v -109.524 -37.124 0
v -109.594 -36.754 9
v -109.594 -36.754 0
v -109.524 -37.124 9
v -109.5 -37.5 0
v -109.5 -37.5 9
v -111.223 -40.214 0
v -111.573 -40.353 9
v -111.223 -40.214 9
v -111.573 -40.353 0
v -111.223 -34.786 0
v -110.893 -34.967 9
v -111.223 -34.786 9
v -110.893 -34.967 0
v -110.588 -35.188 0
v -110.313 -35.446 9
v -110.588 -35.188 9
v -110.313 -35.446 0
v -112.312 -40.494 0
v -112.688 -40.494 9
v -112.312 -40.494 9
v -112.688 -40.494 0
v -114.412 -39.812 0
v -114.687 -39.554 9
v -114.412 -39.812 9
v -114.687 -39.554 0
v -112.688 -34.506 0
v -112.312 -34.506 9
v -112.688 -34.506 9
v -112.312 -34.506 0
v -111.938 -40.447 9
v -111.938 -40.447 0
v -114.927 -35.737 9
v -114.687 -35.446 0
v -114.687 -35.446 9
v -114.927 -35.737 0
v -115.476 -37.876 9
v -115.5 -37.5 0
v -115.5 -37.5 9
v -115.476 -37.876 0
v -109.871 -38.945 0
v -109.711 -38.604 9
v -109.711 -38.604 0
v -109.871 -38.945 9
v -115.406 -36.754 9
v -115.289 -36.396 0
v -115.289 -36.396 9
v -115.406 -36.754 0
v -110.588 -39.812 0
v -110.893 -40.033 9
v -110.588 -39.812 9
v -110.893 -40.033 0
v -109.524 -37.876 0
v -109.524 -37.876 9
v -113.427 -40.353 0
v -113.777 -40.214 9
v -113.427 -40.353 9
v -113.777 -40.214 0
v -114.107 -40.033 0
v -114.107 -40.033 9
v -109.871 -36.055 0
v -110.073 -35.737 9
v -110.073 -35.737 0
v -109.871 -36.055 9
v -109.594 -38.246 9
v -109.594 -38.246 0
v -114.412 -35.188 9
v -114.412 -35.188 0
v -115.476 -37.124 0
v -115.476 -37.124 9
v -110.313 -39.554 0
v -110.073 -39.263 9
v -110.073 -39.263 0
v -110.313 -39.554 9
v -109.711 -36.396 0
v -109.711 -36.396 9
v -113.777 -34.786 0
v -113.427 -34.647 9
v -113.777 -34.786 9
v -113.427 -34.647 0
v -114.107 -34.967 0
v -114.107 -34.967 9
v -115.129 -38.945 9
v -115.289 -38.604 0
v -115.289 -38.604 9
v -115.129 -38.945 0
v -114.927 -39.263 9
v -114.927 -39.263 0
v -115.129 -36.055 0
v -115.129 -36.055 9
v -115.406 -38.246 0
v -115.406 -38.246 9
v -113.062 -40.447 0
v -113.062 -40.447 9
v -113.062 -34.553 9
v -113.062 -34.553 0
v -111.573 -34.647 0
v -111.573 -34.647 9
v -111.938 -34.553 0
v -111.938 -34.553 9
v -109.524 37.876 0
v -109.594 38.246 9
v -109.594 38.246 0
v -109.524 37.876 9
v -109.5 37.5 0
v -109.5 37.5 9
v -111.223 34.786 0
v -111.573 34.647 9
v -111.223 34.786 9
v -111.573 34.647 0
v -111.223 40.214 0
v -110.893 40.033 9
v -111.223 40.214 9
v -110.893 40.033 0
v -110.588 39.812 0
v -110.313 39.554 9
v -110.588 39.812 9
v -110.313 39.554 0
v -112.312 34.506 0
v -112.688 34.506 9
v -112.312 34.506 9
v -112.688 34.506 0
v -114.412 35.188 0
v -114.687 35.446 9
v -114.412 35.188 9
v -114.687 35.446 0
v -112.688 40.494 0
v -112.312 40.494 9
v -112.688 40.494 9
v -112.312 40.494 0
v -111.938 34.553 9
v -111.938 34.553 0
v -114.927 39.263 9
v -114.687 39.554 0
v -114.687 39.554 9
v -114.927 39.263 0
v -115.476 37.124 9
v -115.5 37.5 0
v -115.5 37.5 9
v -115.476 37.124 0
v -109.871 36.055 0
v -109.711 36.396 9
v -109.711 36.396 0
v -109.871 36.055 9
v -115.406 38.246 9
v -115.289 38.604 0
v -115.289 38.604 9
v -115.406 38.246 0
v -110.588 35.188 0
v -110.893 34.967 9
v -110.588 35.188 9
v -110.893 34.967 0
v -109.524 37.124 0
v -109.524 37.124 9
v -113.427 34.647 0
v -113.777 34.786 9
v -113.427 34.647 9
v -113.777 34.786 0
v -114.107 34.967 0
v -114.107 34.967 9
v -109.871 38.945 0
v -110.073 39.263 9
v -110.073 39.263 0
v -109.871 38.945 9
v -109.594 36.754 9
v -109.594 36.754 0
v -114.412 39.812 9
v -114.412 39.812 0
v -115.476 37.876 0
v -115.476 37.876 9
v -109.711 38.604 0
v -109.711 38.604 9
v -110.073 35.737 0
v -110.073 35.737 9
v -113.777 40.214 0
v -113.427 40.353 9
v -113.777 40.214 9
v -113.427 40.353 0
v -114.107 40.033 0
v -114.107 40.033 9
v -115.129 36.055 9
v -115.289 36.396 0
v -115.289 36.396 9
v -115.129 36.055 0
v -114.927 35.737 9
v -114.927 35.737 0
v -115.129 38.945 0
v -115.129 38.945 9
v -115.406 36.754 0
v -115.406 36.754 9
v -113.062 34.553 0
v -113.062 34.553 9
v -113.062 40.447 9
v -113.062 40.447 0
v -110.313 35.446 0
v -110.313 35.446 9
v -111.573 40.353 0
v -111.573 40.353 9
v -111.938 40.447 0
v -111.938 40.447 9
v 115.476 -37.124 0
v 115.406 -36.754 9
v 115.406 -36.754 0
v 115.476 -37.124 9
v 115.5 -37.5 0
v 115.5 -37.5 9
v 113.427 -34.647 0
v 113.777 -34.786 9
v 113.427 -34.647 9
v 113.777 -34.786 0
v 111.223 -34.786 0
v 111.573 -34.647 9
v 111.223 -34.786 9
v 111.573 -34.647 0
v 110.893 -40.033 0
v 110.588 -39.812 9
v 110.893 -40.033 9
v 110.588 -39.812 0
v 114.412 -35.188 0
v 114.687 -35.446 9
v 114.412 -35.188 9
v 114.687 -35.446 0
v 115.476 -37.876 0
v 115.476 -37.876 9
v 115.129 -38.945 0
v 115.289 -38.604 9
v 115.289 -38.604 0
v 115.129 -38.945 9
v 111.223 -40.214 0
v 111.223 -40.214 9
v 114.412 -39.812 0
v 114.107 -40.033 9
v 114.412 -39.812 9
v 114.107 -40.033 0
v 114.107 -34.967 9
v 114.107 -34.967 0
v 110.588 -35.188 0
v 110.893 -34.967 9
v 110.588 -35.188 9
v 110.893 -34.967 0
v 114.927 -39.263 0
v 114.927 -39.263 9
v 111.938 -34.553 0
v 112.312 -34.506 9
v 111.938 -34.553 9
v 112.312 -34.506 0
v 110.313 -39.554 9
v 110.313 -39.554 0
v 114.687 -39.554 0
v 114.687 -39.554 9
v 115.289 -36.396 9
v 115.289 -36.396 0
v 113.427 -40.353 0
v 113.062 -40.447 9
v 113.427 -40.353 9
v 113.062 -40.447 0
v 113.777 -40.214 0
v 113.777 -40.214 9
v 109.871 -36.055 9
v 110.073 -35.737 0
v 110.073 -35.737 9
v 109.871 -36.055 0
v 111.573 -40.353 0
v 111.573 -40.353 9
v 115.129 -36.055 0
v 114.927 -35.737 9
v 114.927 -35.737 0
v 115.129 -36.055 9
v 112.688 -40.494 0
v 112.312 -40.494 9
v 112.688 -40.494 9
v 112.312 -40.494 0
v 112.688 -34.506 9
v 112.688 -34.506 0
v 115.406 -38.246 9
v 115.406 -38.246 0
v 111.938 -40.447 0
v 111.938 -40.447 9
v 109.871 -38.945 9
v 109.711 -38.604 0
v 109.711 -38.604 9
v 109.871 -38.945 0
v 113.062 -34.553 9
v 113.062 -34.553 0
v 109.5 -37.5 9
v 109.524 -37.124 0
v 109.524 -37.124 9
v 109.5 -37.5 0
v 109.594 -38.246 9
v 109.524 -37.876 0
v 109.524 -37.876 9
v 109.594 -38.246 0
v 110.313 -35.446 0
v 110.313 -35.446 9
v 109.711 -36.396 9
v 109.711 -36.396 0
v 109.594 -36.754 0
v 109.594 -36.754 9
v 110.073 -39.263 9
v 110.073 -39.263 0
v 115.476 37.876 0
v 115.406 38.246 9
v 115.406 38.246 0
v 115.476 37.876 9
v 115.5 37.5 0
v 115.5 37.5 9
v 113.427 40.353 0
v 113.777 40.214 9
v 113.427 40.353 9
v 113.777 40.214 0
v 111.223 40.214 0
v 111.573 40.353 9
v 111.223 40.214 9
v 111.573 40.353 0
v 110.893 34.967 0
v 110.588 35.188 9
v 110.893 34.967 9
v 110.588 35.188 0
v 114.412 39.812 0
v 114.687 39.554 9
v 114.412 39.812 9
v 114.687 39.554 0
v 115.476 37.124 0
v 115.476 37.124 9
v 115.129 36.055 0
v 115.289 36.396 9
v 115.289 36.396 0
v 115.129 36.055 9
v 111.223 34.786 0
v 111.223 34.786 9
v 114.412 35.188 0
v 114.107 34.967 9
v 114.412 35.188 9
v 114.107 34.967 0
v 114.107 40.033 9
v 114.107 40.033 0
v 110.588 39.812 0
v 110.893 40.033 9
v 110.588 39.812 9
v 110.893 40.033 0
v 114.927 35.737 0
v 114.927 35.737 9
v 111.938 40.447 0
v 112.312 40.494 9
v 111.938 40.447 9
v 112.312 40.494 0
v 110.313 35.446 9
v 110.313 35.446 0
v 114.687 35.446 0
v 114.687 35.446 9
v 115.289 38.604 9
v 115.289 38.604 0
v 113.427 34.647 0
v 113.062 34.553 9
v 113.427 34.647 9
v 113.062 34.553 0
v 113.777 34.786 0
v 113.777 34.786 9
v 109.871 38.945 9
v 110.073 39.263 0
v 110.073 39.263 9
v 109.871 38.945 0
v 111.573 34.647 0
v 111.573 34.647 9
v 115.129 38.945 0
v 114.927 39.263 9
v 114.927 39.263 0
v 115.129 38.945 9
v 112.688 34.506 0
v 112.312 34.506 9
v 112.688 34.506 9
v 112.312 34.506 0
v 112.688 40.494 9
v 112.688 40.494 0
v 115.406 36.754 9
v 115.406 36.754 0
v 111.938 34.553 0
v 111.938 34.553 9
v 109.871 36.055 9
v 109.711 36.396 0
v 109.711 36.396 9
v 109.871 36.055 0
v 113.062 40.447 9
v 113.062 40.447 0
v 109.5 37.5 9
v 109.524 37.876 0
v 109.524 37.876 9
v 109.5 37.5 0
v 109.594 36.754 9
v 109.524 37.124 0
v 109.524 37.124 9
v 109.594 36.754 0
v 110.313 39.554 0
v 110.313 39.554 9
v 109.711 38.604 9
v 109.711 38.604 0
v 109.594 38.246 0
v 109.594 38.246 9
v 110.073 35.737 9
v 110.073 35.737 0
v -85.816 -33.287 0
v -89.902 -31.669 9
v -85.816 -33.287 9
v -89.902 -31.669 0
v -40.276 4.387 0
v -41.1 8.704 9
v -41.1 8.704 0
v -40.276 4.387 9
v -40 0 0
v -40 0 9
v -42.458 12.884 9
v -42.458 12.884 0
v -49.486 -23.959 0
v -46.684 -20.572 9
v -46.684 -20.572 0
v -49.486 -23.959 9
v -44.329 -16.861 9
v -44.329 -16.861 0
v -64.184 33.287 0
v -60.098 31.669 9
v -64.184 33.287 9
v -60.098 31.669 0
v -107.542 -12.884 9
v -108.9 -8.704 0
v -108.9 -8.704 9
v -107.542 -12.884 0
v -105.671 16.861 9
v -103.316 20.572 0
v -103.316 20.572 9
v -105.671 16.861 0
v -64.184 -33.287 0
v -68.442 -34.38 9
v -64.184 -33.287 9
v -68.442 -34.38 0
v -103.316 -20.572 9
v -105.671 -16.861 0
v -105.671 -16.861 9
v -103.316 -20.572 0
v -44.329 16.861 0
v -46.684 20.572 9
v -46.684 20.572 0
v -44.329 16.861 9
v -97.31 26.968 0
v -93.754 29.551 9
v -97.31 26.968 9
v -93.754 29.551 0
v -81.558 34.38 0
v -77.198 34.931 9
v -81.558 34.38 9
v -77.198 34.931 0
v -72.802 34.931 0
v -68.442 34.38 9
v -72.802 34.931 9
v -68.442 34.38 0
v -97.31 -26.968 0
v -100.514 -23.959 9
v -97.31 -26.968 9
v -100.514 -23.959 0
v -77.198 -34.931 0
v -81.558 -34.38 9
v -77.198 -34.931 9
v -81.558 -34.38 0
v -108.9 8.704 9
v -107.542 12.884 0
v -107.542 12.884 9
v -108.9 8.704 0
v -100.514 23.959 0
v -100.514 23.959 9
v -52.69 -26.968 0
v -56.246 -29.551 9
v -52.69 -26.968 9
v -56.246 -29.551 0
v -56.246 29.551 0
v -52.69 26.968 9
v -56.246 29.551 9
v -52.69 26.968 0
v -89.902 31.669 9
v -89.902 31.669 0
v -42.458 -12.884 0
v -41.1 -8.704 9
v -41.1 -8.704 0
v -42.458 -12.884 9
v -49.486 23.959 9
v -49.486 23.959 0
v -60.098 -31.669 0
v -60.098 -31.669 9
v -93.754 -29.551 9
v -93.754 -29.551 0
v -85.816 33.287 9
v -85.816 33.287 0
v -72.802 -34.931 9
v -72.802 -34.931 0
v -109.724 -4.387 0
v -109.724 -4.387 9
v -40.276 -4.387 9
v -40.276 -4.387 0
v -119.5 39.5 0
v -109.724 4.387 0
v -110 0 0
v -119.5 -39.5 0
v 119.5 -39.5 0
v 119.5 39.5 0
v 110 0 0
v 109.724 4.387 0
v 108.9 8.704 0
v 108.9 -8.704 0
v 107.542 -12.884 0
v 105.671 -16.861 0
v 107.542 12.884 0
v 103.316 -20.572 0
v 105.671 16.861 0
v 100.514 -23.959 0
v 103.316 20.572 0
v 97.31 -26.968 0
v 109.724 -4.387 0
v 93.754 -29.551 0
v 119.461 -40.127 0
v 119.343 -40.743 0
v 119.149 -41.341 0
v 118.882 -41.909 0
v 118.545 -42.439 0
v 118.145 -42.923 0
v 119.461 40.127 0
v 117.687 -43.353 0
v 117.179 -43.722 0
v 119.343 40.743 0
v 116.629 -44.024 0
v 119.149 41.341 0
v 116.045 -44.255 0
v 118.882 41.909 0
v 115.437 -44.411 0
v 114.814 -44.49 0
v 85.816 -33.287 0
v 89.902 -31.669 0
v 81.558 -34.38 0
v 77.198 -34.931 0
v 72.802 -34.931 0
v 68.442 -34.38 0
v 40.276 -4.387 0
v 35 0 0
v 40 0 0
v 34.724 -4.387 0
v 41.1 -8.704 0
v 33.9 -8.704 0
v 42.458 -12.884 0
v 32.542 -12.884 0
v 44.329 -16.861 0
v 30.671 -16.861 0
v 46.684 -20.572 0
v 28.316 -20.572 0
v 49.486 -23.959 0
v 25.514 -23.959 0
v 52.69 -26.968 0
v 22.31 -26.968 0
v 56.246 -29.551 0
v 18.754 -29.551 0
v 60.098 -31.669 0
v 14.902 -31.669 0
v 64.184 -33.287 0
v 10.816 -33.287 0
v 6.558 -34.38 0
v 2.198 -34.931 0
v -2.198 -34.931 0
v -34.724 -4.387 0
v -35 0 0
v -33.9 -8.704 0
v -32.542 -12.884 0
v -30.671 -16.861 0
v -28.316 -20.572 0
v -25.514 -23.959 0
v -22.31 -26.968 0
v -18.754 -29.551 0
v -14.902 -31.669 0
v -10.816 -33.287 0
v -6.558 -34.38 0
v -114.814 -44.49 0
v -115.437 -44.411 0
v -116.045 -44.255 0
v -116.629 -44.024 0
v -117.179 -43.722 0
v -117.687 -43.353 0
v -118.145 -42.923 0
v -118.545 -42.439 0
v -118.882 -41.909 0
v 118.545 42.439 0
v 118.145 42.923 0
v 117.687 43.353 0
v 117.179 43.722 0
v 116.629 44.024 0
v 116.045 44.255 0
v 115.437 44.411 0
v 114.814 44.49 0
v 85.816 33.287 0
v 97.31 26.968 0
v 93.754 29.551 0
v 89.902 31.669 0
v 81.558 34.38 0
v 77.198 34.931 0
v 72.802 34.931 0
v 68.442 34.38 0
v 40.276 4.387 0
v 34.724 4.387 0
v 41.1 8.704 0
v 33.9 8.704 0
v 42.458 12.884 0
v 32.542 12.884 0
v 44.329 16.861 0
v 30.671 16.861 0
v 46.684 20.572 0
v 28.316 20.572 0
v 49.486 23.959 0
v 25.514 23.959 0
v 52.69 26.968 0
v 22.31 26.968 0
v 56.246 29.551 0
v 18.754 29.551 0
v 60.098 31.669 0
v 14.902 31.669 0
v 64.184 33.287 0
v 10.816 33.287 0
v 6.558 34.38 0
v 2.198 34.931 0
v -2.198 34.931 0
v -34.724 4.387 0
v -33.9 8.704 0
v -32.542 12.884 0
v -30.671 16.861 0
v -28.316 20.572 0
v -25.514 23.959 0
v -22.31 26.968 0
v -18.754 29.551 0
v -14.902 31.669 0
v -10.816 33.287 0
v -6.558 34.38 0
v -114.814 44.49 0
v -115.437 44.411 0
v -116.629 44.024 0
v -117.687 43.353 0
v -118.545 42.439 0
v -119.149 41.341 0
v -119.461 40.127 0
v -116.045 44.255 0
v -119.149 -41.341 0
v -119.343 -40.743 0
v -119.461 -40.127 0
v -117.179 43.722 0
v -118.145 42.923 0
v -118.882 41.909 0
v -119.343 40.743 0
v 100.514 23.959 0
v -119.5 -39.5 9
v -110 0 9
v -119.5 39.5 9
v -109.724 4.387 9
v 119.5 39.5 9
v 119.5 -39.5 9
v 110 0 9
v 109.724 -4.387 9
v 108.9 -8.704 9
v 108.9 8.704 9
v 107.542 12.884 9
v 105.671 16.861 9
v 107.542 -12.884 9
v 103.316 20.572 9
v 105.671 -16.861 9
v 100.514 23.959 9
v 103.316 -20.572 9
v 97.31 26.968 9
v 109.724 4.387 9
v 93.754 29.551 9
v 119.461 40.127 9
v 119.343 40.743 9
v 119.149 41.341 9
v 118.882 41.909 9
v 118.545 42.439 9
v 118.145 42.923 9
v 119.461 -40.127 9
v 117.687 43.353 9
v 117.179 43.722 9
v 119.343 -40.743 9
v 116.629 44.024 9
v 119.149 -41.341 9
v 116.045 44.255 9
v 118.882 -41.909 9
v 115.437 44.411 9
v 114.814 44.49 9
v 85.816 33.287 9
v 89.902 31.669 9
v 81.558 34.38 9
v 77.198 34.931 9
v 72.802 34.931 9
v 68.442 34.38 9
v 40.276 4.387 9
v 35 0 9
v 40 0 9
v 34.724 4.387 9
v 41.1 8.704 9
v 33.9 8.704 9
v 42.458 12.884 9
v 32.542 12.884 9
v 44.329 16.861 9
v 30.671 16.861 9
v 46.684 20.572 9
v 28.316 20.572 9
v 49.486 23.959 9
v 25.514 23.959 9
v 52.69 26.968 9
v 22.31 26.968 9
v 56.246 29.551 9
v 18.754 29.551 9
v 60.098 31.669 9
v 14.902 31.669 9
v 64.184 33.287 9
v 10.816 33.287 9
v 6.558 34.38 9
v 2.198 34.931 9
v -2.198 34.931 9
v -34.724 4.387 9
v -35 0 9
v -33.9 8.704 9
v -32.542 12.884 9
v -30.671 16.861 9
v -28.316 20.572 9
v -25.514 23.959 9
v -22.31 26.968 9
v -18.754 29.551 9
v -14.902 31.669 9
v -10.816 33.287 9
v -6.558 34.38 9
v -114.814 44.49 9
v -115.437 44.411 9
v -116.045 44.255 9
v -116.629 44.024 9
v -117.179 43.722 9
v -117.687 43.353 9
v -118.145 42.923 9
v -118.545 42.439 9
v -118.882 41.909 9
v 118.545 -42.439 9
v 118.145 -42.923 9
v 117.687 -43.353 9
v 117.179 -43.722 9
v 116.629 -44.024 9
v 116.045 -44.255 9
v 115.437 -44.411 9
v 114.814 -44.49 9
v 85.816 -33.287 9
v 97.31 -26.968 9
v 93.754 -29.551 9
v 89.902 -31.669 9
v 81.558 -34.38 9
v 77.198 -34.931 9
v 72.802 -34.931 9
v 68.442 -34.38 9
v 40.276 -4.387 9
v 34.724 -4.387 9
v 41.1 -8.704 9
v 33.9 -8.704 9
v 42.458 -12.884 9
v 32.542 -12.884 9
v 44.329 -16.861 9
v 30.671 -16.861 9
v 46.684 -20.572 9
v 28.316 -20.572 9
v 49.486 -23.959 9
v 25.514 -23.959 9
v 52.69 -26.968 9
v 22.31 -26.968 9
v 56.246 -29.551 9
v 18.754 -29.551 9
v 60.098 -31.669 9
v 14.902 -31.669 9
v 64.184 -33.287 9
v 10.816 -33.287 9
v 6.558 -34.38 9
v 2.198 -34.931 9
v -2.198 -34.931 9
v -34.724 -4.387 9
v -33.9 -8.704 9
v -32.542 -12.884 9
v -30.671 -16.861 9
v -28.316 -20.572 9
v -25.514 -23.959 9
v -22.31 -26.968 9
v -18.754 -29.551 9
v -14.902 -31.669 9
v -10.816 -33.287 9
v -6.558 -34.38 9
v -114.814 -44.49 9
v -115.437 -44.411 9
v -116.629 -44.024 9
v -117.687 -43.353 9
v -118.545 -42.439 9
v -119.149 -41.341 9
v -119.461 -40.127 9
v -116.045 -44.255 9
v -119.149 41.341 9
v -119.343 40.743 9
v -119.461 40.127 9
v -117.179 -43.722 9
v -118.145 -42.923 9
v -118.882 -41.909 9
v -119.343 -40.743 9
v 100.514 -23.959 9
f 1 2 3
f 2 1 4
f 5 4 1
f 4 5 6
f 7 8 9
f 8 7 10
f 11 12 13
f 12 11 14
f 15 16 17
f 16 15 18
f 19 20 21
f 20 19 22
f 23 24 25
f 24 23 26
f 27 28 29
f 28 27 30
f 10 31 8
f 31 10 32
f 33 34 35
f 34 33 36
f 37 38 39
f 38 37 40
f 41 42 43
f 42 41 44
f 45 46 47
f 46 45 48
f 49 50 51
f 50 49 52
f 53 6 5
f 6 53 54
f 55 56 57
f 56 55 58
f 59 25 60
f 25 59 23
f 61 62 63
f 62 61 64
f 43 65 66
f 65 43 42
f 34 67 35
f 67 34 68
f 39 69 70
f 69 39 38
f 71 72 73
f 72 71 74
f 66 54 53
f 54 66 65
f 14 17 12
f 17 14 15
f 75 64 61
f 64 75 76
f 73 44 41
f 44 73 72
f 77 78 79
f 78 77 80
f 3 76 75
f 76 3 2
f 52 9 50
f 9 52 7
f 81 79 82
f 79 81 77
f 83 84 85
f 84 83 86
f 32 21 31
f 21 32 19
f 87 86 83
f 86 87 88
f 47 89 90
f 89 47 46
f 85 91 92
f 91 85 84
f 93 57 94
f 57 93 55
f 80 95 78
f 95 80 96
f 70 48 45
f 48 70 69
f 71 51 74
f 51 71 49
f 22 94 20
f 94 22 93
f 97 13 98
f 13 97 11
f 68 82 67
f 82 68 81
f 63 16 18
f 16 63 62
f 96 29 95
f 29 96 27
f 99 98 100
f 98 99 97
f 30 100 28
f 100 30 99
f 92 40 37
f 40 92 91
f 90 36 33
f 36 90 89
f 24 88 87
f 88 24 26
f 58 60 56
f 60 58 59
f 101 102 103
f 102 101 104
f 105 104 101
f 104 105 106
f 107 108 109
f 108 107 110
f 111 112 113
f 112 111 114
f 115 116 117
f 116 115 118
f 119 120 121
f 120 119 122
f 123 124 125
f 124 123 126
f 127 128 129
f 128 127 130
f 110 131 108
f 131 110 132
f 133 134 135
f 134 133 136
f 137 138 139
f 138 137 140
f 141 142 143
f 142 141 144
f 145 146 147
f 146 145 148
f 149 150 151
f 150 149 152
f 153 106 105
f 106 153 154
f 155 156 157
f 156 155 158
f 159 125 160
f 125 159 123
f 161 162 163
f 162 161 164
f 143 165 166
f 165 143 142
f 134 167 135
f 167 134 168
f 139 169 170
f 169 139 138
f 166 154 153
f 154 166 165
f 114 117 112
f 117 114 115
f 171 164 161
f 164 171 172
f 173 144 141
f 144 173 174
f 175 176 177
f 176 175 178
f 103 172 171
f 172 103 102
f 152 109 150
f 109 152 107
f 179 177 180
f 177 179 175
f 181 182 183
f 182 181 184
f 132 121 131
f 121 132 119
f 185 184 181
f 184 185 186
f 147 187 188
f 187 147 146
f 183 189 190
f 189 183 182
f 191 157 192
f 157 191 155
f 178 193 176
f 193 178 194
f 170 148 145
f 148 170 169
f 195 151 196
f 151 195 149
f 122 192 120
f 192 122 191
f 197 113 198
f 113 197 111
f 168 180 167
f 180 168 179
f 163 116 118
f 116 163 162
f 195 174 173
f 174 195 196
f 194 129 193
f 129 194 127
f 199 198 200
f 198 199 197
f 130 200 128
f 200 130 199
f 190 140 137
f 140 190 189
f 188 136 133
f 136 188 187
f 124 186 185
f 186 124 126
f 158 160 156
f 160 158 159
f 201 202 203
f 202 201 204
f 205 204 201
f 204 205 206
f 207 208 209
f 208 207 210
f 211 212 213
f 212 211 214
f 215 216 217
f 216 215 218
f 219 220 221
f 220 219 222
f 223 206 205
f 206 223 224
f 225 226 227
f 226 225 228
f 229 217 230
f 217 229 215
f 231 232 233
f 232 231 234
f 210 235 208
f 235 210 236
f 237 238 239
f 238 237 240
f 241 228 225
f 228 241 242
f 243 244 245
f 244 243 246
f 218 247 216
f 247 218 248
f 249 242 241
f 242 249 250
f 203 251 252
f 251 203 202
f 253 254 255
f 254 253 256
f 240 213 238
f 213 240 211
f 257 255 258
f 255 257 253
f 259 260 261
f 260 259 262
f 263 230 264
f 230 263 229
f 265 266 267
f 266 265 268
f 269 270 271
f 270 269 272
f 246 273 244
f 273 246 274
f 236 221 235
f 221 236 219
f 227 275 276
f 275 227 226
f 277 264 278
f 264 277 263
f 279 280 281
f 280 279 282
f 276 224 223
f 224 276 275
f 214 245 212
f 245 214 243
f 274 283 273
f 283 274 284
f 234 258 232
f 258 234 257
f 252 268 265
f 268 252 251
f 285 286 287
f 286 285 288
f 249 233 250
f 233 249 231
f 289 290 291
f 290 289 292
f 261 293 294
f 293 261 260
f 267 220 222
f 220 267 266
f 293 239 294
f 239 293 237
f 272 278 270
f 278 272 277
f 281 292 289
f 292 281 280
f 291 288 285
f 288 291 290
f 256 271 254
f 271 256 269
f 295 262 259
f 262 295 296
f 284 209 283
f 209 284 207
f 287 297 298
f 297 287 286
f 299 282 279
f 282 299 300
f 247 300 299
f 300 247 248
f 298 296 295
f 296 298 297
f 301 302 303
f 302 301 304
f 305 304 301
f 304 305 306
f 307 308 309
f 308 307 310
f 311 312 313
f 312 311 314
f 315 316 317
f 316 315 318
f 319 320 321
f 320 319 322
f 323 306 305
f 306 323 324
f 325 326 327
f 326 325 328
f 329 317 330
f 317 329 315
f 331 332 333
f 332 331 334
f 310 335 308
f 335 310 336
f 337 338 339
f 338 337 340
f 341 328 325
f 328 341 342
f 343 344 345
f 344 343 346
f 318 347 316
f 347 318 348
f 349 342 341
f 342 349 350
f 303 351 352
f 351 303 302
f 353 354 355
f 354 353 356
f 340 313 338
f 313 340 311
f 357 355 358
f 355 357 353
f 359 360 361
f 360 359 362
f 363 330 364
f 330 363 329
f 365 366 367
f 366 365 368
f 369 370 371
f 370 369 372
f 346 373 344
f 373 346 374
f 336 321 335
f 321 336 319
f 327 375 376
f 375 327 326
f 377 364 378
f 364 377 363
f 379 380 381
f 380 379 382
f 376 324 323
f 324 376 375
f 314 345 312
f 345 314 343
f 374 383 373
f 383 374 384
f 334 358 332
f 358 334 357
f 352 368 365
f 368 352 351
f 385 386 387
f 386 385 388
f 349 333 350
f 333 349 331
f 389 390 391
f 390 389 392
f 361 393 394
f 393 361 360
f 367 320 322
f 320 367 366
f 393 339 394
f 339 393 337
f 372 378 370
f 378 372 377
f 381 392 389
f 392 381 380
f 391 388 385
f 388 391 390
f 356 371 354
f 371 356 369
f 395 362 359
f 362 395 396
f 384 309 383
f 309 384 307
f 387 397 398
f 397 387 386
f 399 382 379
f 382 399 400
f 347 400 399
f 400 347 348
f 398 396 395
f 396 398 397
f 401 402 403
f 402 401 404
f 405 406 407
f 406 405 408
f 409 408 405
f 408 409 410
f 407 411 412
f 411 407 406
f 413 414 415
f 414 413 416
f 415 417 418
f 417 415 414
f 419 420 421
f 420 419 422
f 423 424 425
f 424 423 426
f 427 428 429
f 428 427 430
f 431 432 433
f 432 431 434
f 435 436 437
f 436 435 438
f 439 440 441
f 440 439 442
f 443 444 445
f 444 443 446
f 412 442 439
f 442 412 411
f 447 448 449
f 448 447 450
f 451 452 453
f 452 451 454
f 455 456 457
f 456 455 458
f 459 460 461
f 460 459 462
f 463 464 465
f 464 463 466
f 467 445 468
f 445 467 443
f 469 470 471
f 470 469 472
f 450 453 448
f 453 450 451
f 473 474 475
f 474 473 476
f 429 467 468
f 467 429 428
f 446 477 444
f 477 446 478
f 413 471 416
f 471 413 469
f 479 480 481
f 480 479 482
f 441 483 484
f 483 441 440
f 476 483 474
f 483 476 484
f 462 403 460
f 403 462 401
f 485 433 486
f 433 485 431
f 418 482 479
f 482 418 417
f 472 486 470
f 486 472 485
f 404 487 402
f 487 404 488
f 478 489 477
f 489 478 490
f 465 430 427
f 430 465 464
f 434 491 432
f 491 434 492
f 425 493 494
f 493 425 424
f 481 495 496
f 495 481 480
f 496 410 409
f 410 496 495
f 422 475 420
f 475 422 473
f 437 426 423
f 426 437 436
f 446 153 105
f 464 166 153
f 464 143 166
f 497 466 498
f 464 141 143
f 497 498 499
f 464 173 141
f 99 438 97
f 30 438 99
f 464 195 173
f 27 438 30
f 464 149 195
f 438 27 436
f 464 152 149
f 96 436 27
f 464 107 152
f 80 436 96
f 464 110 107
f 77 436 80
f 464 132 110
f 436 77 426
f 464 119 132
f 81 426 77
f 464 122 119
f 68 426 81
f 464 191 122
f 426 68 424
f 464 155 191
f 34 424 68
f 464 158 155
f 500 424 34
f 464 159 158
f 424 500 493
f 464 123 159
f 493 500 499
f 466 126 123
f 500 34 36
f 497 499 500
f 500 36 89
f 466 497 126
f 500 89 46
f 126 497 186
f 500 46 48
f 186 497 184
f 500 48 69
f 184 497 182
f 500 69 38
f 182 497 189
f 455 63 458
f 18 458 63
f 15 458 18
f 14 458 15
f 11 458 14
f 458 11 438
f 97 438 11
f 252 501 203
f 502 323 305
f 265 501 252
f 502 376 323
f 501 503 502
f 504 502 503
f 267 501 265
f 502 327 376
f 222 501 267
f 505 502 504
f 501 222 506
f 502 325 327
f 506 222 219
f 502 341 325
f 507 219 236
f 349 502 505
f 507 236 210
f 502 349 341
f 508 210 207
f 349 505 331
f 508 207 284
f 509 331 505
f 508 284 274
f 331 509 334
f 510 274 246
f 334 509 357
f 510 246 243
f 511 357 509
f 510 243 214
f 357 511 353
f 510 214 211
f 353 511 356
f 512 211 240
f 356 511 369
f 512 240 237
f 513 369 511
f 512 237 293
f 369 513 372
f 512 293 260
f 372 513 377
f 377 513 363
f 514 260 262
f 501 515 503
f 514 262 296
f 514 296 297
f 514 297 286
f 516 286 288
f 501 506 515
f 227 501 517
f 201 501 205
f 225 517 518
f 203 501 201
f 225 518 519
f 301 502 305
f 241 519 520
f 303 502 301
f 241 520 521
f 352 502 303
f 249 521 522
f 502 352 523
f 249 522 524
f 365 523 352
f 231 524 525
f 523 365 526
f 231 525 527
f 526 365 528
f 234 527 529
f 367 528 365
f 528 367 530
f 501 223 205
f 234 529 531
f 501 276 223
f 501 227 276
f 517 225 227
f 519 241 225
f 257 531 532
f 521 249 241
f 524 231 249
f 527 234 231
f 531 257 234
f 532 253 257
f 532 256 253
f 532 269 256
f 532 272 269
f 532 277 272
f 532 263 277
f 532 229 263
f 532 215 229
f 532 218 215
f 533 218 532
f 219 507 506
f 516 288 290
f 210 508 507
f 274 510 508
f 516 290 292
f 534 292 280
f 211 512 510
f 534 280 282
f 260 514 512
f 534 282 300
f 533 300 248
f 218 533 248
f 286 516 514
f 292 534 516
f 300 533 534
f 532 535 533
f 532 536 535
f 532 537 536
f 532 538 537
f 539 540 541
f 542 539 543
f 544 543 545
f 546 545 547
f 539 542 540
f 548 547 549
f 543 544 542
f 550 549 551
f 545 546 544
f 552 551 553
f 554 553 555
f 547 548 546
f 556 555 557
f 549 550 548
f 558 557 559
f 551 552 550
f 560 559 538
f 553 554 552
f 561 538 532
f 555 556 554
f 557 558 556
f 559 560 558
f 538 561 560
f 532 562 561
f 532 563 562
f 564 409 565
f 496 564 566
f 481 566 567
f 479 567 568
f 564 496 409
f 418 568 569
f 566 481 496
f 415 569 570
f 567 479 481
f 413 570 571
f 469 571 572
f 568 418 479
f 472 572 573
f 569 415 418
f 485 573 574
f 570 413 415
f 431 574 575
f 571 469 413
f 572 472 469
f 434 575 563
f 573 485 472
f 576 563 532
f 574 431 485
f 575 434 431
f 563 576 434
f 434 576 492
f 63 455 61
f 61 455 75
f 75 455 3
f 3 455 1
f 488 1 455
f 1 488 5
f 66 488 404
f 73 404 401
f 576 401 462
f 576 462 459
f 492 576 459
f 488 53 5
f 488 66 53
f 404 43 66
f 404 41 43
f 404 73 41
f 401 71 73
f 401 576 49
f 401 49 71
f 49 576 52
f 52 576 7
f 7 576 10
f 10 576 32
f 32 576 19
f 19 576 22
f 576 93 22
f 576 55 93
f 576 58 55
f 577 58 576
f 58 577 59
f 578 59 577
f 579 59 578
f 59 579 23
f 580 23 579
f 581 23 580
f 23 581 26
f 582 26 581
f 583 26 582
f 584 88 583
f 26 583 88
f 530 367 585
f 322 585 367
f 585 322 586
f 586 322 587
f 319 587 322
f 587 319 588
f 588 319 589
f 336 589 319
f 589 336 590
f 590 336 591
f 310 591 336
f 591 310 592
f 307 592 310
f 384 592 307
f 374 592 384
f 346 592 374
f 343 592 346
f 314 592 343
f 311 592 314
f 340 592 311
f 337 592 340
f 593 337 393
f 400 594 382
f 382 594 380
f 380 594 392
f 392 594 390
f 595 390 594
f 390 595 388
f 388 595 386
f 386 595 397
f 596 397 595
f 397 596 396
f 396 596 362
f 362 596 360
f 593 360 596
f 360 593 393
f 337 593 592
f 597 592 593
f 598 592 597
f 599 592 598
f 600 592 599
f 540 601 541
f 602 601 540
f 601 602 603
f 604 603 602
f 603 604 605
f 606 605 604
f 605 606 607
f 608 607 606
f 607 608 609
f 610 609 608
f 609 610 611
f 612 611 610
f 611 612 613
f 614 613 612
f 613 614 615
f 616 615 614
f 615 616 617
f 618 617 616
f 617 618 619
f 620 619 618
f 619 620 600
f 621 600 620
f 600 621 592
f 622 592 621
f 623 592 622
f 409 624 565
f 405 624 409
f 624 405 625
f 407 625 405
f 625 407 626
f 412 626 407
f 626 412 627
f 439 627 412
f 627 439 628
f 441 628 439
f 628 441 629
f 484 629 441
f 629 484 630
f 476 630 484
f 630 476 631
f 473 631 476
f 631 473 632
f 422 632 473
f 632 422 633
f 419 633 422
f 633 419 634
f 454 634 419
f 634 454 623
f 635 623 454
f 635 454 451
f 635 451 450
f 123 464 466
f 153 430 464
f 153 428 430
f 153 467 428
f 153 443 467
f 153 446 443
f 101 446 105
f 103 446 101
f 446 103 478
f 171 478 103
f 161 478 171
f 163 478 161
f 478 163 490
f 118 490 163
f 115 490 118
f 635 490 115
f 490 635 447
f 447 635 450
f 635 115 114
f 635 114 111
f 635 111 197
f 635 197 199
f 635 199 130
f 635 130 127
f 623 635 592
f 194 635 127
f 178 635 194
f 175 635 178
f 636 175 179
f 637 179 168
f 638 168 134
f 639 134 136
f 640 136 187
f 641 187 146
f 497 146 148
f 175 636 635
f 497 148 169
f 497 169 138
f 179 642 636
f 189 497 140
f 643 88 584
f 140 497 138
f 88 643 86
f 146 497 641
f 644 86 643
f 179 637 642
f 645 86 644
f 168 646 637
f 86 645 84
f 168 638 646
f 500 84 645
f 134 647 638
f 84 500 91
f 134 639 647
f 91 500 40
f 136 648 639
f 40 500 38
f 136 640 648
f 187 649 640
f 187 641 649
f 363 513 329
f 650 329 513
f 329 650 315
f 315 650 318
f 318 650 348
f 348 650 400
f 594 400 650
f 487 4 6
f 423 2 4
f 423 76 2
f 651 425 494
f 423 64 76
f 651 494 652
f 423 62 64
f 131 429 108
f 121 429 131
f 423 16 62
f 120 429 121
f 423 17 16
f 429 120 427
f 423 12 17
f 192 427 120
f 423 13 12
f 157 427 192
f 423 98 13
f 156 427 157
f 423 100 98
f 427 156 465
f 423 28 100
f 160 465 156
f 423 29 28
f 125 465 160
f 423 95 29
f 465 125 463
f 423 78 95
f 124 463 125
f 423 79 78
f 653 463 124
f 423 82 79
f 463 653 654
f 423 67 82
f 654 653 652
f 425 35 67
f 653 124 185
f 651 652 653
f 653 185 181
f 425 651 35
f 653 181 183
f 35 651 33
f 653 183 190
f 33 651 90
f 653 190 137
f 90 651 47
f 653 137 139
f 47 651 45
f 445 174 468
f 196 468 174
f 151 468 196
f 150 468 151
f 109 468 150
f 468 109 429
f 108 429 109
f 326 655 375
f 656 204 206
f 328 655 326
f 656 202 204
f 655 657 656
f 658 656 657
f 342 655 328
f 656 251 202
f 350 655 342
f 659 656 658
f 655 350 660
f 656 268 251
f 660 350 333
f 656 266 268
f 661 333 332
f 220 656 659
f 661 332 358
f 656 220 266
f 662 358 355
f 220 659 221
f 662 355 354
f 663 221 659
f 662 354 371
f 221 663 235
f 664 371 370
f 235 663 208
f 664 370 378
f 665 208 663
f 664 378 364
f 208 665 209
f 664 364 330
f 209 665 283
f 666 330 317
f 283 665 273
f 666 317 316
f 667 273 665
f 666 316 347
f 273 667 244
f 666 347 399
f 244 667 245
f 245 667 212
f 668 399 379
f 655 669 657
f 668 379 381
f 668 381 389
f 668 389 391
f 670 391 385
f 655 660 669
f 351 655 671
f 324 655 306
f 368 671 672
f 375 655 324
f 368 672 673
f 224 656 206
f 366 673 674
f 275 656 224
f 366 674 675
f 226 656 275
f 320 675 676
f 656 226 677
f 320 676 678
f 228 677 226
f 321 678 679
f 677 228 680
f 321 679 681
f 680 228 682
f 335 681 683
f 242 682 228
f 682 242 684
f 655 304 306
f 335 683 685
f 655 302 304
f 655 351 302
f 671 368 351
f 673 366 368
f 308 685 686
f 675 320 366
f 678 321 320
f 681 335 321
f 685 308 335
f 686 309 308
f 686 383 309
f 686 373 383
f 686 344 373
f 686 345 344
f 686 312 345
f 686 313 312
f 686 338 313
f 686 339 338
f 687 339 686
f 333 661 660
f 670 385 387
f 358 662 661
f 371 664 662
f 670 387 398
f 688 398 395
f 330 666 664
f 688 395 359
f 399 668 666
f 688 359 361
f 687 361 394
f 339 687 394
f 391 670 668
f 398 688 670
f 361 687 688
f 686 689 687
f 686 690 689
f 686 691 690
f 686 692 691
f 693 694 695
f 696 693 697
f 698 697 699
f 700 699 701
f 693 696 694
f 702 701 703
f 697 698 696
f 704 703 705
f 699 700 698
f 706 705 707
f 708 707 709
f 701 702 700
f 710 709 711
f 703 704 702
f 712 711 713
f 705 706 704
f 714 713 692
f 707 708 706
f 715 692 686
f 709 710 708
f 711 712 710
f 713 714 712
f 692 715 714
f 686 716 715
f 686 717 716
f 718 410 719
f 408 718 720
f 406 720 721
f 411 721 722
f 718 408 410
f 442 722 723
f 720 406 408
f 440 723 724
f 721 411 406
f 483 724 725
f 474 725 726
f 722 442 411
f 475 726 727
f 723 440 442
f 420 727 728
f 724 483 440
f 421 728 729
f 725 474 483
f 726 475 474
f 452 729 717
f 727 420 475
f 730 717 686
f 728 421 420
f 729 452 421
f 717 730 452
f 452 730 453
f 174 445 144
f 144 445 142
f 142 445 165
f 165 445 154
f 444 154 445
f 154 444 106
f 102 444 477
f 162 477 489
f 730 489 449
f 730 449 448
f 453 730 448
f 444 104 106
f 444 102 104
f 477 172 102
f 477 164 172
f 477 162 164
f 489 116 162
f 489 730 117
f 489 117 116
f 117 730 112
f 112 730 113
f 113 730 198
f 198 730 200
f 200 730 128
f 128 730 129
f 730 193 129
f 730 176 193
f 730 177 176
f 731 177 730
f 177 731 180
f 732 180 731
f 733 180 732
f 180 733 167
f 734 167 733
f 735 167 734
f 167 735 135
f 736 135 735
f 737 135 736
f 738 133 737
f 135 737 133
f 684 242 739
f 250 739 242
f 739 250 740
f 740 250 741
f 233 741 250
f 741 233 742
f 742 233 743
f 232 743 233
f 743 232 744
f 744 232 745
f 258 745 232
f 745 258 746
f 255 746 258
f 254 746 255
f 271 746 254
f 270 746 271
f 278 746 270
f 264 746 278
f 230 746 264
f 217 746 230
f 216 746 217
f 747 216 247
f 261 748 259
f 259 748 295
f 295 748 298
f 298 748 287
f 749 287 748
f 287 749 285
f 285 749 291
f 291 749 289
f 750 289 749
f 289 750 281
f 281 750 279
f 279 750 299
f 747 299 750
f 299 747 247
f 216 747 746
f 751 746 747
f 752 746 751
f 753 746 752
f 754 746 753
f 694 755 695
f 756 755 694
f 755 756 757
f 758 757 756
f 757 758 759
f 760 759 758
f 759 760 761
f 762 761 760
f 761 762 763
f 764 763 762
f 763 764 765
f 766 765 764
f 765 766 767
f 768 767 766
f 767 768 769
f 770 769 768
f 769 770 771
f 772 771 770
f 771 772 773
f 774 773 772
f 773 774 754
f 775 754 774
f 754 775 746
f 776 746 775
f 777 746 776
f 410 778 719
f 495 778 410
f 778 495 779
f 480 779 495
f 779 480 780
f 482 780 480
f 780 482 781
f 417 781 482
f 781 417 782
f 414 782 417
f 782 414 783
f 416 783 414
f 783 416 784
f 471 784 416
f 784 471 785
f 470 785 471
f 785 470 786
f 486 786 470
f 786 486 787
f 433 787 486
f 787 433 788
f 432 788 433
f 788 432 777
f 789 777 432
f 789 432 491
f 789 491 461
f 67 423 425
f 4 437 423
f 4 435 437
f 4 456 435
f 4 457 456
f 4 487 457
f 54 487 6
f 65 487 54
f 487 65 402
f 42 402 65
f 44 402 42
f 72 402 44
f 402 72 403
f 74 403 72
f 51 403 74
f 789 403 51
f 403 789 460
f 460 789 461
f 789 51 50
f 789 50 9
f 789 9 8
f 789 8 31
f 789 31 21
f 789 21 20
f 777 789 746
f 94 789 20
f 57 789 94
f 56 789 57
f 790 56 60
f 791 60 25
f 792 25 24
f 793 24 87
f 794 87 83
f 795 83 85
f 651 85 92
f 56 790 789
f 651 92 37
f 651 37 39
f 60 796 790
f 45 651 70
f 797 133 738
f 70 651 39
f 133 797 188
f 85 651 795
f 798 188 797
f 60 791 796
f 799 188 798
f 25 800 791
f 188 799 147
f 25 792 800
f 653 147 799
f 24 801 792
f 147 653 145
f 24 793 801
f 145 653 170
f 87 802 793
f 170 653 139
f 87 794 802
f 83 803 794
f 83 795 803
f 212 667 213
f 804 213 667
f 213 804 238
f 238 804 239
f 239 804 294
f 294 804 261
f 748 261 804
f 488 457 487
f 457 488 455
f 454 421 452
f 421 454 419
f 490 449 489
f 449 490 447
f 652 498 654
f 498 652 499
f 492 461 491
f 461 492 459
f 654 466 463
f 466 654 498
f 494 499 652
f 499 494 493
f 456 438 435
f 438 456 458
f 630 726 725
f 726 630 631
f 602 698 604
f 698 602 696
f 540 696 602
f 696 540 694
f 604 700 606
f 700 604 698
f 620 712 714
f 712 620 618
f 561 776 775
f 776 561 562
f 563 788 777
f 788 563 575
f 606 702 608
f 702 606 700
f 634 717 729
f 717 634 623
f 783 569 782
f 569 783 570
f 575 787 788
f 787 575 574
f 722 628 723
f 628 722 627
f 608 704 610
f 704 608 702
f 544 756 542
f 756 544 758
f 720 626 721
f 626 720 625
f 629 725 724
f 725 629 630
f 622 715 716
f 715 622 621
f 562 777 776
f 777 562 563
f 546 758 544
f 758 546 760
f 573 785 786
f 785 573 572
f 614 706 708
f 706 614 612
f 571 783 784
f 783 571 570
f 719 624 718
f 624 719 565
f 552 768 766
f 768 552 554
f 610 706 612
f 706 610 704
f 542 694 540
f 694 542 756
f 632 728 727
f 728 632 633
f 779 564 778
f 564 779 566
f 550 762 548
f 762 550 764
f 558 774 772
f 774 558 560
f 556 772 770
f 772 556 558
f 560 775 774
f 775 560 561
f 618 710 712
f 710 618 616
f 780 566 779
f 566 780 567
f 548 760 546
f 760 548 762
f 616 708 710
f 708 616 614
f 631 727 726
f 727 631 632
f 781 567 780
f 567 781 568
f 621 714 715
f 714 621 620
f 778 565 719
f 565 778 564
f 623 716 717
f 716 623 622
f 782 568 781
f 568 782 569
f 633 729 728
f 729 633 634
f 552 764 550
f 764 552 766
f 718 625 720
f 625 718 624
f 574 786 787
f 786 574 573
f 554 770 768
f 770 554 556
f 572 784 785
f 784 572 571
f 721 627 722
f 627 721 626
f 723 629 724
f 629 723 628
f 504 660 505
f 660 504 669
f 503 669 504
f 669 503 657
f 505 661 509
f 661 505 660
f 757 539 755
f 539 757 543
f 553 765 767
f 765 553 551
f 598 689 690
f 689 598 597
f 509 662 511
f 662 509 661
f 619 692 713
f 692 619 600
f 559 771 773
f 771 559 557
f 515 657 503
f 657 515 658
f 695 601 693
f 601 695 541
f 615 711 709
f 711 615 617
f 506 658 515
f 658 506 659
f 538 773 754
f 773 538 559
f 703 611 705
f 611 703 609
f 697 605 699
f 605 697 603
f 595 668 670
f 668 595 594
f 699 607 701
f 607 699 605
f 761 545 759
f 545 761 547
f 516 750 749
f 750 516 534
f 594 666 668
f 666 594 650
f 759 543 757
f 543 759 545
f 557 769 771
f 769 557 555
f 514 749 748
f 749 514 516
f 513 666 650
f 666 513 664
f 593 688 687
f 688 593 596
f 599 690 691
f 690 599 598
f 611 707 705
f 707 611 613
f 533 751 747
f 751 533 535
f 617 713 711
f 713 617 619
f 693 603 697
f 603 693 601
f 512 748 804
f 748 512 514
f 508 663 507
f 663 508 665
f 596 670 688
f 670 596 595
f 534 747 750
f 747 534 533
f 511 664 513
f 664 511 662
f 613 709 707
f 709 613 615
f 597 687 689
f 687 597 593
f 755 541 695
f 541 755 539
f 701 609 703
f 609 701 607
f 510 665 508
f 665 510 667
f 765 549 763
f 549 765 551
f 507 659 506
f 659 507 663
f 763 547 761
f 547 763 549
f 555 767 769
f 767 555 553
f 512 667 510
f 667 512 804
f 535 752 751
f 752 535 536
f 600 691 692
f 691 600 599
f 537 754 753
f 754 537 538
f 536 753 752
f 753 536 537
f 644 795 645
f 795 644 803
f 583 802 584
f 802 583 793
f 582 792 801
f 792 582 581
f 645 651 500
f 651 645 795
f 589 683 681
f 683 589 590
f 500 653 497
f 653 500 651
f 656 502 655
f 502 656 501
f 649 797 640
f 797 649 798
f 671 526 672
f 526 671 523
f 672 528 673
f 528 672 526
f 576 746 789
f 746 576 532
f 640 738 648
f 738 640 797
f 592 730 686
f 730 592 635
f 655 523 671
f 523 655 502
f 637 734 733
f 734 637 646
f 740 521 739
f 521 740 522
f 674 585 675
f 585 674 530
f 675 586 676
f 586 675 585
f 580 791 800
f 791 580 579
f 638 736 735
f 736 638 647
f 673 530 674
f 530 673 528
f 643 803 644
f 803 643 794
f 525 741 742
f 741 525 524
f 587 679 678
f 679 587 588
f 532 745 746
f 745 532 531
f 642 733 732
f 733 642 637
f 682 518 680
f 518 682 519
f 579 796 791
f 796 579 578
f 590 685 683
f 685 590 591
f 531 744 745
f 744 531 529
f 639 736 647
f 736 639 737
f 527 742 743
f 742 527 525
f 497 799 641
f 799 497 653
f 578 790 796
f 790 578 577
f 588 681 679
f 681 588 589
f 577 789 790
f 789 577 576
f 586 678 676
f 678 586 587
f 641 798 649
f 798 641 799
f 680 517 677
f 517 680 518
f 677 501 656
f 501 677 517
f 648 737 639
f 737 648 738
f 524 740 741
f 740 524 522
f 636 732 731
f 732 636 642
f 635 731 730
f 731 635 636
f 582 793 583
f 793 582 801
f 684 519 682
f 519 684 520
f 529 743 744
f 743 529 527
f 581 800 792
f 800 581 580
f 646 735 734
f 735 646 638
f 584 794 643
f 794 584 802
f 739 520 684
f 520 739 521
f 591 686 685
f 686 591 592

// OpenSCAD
$fn = 50;


difference() {
	union() {
		hull() {
			translate(v = [-114.5000000000, 39.5000000000, 0]) {
				cylinder(h = 9, r = 5);
			}
			translate(v = [114.5000000000, 39.5000000000, 0]) {
				cylinder(h = 9, r = 5);
			}
			translate(v = [-114.5000000000, -39.5000000000, 0]) {
				cylinder(h = 9, r = 5);
			}
			translate(v = [114.5000000000, -39.5000000000, 0]) {
				cylinder(h = 9, r = 5);
			}
		}
	}
	union() {
		#translate(v = [-112.5000000000, -37.5000000000, -100.0000000000]) {
			cylinder(h = 200, r = 3.0000000000);
		}
		#translate(v = [-112.5000000000, 37.5000000000, -100.0000000000]) {
			cylinder(h = 200, r = 3.0000000000);
		}
		#translate(v = [112.5000000000, -37.5000000000, -100.0000000000]) {
			cylinder(h = 200, r = 3.0000000000);
		}
		#translate(v = [112.5000000000, 37.5000000000, -100.0000000000]) {
			cylinder(h = 200, r = 3.0000000000);
		}
		#translate(v = [-75.0000000000, 0, 0]) {
			cylinder(h = 9, r = 35.0000000000);
		}
		#cylinder(h = 9, r = 35.0000000000);
		#translate(v = [75.0000000000, 0, 0]) {
			cylinder(h = 9, r = 35.0000000000);
		}
	}
}
